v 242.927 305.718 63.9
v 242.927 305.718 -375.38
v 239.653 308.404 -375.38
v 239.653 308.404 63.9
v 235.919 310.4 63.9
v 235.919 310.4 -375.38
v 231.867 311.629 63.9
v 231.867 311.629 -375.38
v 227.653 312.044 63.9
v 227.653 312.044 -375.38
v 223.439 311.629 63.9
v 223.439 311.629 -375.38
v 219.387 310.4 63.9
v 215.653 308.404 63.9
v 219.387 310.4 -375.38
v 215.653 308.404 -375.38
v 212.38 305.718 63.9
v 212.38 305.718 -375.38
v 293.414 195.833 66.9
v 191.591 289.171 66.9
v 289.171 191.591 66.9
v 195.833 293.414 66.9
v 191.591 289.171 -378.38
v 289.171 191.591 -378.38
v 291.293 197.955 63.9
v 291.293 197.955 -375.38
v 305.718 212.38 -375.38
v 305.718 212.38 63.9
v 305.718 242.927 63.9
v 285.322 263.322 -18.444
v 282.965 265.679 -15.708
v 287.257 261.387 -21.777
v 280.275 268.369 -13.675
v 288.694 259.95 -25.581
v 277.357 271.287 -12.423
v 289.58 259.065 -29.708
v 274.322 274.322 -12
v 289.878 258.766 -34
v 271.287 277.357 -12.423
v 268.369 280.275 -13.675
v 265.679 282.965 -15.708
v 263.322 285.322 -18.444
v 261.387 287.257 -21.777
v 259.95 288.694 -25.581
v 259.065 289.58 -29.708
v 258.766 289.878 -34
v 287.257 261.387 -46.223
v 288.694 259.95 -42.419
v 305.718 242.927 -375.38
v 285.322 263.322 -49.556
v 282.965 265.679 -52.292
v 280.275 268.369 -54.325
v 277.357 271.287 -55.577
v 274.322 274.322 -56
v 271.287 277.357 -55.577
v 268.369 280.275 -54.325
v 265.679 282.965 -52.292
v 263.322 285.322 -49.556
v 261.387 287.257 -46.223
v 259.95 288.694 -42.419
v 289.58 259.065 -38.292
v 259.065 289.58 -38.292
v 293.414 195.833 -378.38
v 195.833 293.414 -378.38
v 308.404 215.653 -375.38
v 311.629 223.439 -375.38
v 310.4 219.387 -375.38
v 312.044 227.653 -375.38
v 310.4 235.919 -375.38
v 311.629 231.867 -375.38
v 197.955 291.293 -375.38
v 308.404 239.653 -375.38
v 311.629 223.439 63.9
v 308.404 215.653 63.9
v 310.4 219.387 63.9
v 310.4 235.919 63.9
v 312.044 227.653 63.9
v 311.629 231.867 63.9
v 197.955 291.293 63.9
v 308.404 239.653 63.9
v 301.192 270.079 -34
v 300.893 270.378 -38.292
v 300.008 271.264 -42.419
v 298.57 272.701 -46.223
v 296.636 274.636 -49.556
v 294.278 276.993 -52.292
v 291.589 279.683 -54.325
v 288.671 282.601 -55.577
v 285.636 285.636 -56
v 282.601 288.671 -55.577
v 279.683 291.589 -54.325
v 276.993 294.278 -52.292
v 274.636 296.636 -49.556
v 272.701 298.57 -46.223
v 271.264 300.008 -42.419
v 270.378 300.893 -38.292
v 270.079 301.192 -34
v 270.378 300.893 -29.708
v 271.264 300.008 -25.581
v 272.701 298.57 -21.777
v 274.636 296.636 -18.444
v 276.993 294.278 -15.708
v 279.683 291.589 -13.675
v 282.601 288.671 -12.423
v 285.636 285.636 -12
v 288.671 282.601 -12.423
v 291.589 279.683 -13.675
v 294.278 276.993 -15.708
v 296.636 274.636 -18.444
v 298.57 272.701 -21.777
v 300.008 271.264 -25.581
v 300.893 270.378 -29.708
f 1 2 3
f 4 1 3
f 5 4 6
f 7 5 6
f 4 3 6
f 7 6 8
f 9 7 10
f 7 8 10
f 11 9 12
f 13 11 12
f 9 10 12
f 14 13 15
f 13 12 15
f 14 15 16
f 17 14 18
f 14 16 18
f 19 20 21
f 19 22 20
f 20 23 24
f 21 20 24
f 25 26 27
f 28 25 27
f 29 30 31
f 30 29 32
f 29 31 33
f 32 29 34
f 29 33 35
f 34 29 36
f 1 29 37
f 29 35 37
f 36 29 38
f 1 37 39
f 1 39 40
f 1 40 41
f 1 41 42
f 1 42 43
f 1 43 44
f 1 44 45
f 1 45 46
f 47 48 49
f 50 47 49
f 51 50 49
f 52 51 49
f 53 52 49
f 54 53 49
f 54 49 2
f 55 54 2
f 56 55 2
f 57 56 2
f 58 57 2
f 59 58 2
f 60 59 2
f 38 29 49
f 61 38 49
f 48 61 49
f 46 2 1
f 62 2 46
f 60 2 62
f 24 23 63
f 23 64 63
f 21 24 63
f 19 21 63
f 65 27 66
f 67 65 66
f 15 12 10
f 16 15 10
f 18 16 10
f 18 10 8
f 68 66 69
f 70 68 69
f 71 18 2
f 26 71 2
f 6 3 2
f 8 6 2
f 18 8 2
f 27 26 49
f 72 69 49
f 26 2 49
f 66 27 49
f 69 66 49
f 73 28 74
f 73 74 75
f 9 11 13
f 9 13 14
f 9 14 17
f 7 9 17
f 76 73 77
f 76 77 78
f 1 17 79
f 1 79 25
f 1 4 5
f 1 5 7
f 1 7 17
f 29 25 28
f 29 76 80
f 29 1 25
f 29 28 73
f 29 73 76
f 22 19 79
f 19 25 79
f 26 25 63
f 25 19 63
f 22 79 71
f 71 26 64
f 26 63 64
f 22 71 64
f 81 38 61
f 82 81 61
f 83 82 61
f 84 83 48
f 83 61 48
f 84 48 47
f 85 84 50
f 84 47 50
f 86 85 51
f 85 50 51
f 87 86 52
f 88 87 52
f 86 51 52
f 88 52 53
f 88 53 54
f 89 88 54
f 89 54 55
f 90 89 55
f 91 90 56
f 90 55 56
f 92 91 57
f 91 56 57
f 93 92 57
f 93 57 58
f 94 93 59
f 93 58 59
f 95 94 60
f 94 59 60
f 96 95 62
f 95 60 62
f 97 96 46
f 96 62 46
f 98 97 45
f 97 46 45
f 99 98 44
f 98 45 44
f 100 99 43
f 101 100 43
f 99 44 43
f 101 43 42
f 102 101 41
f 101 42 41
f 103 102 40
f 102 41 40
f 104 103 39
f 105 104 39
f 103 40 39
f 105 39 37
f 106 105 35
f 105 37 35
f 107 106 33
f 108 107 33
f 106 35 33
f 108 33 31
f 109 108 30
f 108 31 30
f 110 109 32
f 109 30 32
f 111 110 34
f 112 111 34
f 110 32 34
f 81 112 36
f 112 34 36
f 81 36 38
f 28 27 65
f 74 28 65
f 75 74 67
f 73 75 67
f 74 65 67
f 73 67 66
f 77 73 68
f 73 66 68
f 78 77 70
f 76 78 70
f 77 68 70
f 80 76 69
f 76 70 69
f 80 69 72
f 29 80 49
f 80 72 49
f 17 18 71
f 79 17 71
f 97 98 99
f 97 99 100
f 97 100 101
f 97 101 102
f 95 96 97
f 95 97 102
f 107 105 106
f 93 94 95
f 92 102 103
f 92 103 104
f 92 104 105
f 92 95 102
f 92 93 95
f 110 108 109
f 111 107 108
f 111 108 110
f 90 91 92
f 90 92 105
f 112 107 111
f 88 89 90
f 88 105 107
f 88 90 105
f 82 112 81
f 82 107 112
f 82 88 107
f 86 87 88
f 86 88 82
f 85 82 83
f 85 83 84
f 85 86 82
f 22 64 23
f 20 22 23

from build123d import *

# Parameters (mm, degrees)
COVER_START          = -375.38
COVER_DEPTH          = 439.28
RAIL_START           = -378.38
RAIL_FLANGE_DEPTH    = 445.28
SKETCH3_R            = 22
OIL_FILLER_CAP_DEPTH = 16


with BuildPart() as part:
    # Sketch1 → Cover (new body)
    with BuildSketch(Plane.XY.offset(COVER_START)):
        with BuildLine():
            Line((193.711902706, 287.049997823), (287.049997823, 193.711902706))
            Line((287.049997823, 193.711902706), (305.717616846, 212.379521729))
            ThreePointArc((305.717616846, 212.379521729), (312.044110372, 227.653028203), (305.717616846, 242.926534677))
            Line((305.717616846, 242.926534677), (242.926534677, 305.717616846))
            ThreePointArc((242.926534677, 305.717616846), (227.653028203, 312.044110372), (212.379521729, 305.717616846))
            Line((212.379521729, 305.717616846), (193.711902706, 287.049997823))
        make_face()
    extrude(amount=COVER_DEPTH)

    # Sketch2 → Rail Flange (add)
    with BuildSketch(Plane.XY.offset(RAIL_START)):
        Polygon((191.590582362, 289.171318166), (289.171318166, 191.590582362), (293.413958853, 195.83322305), (195.83322305, 293.413958853), align=None)
    extrude(amount=RAIL_FLANGE_DEPTH)

    # Sketch3 → Oil Filler Cap (add)
    with BuildSketch(Plane(origin=(274.322075761, 274.322075761, 0), x_dir=(0, 0, -1), z_dir=(0.7071067811865477, 0.7071067811865475, 0))):
        with Locations(Location((34, 0, 0), (0, 0, 270))):
            Circle(SKETCH3_R)
    extrude(amount=OIL_FILLER_CAP_DEPTH)


solid = part.part
